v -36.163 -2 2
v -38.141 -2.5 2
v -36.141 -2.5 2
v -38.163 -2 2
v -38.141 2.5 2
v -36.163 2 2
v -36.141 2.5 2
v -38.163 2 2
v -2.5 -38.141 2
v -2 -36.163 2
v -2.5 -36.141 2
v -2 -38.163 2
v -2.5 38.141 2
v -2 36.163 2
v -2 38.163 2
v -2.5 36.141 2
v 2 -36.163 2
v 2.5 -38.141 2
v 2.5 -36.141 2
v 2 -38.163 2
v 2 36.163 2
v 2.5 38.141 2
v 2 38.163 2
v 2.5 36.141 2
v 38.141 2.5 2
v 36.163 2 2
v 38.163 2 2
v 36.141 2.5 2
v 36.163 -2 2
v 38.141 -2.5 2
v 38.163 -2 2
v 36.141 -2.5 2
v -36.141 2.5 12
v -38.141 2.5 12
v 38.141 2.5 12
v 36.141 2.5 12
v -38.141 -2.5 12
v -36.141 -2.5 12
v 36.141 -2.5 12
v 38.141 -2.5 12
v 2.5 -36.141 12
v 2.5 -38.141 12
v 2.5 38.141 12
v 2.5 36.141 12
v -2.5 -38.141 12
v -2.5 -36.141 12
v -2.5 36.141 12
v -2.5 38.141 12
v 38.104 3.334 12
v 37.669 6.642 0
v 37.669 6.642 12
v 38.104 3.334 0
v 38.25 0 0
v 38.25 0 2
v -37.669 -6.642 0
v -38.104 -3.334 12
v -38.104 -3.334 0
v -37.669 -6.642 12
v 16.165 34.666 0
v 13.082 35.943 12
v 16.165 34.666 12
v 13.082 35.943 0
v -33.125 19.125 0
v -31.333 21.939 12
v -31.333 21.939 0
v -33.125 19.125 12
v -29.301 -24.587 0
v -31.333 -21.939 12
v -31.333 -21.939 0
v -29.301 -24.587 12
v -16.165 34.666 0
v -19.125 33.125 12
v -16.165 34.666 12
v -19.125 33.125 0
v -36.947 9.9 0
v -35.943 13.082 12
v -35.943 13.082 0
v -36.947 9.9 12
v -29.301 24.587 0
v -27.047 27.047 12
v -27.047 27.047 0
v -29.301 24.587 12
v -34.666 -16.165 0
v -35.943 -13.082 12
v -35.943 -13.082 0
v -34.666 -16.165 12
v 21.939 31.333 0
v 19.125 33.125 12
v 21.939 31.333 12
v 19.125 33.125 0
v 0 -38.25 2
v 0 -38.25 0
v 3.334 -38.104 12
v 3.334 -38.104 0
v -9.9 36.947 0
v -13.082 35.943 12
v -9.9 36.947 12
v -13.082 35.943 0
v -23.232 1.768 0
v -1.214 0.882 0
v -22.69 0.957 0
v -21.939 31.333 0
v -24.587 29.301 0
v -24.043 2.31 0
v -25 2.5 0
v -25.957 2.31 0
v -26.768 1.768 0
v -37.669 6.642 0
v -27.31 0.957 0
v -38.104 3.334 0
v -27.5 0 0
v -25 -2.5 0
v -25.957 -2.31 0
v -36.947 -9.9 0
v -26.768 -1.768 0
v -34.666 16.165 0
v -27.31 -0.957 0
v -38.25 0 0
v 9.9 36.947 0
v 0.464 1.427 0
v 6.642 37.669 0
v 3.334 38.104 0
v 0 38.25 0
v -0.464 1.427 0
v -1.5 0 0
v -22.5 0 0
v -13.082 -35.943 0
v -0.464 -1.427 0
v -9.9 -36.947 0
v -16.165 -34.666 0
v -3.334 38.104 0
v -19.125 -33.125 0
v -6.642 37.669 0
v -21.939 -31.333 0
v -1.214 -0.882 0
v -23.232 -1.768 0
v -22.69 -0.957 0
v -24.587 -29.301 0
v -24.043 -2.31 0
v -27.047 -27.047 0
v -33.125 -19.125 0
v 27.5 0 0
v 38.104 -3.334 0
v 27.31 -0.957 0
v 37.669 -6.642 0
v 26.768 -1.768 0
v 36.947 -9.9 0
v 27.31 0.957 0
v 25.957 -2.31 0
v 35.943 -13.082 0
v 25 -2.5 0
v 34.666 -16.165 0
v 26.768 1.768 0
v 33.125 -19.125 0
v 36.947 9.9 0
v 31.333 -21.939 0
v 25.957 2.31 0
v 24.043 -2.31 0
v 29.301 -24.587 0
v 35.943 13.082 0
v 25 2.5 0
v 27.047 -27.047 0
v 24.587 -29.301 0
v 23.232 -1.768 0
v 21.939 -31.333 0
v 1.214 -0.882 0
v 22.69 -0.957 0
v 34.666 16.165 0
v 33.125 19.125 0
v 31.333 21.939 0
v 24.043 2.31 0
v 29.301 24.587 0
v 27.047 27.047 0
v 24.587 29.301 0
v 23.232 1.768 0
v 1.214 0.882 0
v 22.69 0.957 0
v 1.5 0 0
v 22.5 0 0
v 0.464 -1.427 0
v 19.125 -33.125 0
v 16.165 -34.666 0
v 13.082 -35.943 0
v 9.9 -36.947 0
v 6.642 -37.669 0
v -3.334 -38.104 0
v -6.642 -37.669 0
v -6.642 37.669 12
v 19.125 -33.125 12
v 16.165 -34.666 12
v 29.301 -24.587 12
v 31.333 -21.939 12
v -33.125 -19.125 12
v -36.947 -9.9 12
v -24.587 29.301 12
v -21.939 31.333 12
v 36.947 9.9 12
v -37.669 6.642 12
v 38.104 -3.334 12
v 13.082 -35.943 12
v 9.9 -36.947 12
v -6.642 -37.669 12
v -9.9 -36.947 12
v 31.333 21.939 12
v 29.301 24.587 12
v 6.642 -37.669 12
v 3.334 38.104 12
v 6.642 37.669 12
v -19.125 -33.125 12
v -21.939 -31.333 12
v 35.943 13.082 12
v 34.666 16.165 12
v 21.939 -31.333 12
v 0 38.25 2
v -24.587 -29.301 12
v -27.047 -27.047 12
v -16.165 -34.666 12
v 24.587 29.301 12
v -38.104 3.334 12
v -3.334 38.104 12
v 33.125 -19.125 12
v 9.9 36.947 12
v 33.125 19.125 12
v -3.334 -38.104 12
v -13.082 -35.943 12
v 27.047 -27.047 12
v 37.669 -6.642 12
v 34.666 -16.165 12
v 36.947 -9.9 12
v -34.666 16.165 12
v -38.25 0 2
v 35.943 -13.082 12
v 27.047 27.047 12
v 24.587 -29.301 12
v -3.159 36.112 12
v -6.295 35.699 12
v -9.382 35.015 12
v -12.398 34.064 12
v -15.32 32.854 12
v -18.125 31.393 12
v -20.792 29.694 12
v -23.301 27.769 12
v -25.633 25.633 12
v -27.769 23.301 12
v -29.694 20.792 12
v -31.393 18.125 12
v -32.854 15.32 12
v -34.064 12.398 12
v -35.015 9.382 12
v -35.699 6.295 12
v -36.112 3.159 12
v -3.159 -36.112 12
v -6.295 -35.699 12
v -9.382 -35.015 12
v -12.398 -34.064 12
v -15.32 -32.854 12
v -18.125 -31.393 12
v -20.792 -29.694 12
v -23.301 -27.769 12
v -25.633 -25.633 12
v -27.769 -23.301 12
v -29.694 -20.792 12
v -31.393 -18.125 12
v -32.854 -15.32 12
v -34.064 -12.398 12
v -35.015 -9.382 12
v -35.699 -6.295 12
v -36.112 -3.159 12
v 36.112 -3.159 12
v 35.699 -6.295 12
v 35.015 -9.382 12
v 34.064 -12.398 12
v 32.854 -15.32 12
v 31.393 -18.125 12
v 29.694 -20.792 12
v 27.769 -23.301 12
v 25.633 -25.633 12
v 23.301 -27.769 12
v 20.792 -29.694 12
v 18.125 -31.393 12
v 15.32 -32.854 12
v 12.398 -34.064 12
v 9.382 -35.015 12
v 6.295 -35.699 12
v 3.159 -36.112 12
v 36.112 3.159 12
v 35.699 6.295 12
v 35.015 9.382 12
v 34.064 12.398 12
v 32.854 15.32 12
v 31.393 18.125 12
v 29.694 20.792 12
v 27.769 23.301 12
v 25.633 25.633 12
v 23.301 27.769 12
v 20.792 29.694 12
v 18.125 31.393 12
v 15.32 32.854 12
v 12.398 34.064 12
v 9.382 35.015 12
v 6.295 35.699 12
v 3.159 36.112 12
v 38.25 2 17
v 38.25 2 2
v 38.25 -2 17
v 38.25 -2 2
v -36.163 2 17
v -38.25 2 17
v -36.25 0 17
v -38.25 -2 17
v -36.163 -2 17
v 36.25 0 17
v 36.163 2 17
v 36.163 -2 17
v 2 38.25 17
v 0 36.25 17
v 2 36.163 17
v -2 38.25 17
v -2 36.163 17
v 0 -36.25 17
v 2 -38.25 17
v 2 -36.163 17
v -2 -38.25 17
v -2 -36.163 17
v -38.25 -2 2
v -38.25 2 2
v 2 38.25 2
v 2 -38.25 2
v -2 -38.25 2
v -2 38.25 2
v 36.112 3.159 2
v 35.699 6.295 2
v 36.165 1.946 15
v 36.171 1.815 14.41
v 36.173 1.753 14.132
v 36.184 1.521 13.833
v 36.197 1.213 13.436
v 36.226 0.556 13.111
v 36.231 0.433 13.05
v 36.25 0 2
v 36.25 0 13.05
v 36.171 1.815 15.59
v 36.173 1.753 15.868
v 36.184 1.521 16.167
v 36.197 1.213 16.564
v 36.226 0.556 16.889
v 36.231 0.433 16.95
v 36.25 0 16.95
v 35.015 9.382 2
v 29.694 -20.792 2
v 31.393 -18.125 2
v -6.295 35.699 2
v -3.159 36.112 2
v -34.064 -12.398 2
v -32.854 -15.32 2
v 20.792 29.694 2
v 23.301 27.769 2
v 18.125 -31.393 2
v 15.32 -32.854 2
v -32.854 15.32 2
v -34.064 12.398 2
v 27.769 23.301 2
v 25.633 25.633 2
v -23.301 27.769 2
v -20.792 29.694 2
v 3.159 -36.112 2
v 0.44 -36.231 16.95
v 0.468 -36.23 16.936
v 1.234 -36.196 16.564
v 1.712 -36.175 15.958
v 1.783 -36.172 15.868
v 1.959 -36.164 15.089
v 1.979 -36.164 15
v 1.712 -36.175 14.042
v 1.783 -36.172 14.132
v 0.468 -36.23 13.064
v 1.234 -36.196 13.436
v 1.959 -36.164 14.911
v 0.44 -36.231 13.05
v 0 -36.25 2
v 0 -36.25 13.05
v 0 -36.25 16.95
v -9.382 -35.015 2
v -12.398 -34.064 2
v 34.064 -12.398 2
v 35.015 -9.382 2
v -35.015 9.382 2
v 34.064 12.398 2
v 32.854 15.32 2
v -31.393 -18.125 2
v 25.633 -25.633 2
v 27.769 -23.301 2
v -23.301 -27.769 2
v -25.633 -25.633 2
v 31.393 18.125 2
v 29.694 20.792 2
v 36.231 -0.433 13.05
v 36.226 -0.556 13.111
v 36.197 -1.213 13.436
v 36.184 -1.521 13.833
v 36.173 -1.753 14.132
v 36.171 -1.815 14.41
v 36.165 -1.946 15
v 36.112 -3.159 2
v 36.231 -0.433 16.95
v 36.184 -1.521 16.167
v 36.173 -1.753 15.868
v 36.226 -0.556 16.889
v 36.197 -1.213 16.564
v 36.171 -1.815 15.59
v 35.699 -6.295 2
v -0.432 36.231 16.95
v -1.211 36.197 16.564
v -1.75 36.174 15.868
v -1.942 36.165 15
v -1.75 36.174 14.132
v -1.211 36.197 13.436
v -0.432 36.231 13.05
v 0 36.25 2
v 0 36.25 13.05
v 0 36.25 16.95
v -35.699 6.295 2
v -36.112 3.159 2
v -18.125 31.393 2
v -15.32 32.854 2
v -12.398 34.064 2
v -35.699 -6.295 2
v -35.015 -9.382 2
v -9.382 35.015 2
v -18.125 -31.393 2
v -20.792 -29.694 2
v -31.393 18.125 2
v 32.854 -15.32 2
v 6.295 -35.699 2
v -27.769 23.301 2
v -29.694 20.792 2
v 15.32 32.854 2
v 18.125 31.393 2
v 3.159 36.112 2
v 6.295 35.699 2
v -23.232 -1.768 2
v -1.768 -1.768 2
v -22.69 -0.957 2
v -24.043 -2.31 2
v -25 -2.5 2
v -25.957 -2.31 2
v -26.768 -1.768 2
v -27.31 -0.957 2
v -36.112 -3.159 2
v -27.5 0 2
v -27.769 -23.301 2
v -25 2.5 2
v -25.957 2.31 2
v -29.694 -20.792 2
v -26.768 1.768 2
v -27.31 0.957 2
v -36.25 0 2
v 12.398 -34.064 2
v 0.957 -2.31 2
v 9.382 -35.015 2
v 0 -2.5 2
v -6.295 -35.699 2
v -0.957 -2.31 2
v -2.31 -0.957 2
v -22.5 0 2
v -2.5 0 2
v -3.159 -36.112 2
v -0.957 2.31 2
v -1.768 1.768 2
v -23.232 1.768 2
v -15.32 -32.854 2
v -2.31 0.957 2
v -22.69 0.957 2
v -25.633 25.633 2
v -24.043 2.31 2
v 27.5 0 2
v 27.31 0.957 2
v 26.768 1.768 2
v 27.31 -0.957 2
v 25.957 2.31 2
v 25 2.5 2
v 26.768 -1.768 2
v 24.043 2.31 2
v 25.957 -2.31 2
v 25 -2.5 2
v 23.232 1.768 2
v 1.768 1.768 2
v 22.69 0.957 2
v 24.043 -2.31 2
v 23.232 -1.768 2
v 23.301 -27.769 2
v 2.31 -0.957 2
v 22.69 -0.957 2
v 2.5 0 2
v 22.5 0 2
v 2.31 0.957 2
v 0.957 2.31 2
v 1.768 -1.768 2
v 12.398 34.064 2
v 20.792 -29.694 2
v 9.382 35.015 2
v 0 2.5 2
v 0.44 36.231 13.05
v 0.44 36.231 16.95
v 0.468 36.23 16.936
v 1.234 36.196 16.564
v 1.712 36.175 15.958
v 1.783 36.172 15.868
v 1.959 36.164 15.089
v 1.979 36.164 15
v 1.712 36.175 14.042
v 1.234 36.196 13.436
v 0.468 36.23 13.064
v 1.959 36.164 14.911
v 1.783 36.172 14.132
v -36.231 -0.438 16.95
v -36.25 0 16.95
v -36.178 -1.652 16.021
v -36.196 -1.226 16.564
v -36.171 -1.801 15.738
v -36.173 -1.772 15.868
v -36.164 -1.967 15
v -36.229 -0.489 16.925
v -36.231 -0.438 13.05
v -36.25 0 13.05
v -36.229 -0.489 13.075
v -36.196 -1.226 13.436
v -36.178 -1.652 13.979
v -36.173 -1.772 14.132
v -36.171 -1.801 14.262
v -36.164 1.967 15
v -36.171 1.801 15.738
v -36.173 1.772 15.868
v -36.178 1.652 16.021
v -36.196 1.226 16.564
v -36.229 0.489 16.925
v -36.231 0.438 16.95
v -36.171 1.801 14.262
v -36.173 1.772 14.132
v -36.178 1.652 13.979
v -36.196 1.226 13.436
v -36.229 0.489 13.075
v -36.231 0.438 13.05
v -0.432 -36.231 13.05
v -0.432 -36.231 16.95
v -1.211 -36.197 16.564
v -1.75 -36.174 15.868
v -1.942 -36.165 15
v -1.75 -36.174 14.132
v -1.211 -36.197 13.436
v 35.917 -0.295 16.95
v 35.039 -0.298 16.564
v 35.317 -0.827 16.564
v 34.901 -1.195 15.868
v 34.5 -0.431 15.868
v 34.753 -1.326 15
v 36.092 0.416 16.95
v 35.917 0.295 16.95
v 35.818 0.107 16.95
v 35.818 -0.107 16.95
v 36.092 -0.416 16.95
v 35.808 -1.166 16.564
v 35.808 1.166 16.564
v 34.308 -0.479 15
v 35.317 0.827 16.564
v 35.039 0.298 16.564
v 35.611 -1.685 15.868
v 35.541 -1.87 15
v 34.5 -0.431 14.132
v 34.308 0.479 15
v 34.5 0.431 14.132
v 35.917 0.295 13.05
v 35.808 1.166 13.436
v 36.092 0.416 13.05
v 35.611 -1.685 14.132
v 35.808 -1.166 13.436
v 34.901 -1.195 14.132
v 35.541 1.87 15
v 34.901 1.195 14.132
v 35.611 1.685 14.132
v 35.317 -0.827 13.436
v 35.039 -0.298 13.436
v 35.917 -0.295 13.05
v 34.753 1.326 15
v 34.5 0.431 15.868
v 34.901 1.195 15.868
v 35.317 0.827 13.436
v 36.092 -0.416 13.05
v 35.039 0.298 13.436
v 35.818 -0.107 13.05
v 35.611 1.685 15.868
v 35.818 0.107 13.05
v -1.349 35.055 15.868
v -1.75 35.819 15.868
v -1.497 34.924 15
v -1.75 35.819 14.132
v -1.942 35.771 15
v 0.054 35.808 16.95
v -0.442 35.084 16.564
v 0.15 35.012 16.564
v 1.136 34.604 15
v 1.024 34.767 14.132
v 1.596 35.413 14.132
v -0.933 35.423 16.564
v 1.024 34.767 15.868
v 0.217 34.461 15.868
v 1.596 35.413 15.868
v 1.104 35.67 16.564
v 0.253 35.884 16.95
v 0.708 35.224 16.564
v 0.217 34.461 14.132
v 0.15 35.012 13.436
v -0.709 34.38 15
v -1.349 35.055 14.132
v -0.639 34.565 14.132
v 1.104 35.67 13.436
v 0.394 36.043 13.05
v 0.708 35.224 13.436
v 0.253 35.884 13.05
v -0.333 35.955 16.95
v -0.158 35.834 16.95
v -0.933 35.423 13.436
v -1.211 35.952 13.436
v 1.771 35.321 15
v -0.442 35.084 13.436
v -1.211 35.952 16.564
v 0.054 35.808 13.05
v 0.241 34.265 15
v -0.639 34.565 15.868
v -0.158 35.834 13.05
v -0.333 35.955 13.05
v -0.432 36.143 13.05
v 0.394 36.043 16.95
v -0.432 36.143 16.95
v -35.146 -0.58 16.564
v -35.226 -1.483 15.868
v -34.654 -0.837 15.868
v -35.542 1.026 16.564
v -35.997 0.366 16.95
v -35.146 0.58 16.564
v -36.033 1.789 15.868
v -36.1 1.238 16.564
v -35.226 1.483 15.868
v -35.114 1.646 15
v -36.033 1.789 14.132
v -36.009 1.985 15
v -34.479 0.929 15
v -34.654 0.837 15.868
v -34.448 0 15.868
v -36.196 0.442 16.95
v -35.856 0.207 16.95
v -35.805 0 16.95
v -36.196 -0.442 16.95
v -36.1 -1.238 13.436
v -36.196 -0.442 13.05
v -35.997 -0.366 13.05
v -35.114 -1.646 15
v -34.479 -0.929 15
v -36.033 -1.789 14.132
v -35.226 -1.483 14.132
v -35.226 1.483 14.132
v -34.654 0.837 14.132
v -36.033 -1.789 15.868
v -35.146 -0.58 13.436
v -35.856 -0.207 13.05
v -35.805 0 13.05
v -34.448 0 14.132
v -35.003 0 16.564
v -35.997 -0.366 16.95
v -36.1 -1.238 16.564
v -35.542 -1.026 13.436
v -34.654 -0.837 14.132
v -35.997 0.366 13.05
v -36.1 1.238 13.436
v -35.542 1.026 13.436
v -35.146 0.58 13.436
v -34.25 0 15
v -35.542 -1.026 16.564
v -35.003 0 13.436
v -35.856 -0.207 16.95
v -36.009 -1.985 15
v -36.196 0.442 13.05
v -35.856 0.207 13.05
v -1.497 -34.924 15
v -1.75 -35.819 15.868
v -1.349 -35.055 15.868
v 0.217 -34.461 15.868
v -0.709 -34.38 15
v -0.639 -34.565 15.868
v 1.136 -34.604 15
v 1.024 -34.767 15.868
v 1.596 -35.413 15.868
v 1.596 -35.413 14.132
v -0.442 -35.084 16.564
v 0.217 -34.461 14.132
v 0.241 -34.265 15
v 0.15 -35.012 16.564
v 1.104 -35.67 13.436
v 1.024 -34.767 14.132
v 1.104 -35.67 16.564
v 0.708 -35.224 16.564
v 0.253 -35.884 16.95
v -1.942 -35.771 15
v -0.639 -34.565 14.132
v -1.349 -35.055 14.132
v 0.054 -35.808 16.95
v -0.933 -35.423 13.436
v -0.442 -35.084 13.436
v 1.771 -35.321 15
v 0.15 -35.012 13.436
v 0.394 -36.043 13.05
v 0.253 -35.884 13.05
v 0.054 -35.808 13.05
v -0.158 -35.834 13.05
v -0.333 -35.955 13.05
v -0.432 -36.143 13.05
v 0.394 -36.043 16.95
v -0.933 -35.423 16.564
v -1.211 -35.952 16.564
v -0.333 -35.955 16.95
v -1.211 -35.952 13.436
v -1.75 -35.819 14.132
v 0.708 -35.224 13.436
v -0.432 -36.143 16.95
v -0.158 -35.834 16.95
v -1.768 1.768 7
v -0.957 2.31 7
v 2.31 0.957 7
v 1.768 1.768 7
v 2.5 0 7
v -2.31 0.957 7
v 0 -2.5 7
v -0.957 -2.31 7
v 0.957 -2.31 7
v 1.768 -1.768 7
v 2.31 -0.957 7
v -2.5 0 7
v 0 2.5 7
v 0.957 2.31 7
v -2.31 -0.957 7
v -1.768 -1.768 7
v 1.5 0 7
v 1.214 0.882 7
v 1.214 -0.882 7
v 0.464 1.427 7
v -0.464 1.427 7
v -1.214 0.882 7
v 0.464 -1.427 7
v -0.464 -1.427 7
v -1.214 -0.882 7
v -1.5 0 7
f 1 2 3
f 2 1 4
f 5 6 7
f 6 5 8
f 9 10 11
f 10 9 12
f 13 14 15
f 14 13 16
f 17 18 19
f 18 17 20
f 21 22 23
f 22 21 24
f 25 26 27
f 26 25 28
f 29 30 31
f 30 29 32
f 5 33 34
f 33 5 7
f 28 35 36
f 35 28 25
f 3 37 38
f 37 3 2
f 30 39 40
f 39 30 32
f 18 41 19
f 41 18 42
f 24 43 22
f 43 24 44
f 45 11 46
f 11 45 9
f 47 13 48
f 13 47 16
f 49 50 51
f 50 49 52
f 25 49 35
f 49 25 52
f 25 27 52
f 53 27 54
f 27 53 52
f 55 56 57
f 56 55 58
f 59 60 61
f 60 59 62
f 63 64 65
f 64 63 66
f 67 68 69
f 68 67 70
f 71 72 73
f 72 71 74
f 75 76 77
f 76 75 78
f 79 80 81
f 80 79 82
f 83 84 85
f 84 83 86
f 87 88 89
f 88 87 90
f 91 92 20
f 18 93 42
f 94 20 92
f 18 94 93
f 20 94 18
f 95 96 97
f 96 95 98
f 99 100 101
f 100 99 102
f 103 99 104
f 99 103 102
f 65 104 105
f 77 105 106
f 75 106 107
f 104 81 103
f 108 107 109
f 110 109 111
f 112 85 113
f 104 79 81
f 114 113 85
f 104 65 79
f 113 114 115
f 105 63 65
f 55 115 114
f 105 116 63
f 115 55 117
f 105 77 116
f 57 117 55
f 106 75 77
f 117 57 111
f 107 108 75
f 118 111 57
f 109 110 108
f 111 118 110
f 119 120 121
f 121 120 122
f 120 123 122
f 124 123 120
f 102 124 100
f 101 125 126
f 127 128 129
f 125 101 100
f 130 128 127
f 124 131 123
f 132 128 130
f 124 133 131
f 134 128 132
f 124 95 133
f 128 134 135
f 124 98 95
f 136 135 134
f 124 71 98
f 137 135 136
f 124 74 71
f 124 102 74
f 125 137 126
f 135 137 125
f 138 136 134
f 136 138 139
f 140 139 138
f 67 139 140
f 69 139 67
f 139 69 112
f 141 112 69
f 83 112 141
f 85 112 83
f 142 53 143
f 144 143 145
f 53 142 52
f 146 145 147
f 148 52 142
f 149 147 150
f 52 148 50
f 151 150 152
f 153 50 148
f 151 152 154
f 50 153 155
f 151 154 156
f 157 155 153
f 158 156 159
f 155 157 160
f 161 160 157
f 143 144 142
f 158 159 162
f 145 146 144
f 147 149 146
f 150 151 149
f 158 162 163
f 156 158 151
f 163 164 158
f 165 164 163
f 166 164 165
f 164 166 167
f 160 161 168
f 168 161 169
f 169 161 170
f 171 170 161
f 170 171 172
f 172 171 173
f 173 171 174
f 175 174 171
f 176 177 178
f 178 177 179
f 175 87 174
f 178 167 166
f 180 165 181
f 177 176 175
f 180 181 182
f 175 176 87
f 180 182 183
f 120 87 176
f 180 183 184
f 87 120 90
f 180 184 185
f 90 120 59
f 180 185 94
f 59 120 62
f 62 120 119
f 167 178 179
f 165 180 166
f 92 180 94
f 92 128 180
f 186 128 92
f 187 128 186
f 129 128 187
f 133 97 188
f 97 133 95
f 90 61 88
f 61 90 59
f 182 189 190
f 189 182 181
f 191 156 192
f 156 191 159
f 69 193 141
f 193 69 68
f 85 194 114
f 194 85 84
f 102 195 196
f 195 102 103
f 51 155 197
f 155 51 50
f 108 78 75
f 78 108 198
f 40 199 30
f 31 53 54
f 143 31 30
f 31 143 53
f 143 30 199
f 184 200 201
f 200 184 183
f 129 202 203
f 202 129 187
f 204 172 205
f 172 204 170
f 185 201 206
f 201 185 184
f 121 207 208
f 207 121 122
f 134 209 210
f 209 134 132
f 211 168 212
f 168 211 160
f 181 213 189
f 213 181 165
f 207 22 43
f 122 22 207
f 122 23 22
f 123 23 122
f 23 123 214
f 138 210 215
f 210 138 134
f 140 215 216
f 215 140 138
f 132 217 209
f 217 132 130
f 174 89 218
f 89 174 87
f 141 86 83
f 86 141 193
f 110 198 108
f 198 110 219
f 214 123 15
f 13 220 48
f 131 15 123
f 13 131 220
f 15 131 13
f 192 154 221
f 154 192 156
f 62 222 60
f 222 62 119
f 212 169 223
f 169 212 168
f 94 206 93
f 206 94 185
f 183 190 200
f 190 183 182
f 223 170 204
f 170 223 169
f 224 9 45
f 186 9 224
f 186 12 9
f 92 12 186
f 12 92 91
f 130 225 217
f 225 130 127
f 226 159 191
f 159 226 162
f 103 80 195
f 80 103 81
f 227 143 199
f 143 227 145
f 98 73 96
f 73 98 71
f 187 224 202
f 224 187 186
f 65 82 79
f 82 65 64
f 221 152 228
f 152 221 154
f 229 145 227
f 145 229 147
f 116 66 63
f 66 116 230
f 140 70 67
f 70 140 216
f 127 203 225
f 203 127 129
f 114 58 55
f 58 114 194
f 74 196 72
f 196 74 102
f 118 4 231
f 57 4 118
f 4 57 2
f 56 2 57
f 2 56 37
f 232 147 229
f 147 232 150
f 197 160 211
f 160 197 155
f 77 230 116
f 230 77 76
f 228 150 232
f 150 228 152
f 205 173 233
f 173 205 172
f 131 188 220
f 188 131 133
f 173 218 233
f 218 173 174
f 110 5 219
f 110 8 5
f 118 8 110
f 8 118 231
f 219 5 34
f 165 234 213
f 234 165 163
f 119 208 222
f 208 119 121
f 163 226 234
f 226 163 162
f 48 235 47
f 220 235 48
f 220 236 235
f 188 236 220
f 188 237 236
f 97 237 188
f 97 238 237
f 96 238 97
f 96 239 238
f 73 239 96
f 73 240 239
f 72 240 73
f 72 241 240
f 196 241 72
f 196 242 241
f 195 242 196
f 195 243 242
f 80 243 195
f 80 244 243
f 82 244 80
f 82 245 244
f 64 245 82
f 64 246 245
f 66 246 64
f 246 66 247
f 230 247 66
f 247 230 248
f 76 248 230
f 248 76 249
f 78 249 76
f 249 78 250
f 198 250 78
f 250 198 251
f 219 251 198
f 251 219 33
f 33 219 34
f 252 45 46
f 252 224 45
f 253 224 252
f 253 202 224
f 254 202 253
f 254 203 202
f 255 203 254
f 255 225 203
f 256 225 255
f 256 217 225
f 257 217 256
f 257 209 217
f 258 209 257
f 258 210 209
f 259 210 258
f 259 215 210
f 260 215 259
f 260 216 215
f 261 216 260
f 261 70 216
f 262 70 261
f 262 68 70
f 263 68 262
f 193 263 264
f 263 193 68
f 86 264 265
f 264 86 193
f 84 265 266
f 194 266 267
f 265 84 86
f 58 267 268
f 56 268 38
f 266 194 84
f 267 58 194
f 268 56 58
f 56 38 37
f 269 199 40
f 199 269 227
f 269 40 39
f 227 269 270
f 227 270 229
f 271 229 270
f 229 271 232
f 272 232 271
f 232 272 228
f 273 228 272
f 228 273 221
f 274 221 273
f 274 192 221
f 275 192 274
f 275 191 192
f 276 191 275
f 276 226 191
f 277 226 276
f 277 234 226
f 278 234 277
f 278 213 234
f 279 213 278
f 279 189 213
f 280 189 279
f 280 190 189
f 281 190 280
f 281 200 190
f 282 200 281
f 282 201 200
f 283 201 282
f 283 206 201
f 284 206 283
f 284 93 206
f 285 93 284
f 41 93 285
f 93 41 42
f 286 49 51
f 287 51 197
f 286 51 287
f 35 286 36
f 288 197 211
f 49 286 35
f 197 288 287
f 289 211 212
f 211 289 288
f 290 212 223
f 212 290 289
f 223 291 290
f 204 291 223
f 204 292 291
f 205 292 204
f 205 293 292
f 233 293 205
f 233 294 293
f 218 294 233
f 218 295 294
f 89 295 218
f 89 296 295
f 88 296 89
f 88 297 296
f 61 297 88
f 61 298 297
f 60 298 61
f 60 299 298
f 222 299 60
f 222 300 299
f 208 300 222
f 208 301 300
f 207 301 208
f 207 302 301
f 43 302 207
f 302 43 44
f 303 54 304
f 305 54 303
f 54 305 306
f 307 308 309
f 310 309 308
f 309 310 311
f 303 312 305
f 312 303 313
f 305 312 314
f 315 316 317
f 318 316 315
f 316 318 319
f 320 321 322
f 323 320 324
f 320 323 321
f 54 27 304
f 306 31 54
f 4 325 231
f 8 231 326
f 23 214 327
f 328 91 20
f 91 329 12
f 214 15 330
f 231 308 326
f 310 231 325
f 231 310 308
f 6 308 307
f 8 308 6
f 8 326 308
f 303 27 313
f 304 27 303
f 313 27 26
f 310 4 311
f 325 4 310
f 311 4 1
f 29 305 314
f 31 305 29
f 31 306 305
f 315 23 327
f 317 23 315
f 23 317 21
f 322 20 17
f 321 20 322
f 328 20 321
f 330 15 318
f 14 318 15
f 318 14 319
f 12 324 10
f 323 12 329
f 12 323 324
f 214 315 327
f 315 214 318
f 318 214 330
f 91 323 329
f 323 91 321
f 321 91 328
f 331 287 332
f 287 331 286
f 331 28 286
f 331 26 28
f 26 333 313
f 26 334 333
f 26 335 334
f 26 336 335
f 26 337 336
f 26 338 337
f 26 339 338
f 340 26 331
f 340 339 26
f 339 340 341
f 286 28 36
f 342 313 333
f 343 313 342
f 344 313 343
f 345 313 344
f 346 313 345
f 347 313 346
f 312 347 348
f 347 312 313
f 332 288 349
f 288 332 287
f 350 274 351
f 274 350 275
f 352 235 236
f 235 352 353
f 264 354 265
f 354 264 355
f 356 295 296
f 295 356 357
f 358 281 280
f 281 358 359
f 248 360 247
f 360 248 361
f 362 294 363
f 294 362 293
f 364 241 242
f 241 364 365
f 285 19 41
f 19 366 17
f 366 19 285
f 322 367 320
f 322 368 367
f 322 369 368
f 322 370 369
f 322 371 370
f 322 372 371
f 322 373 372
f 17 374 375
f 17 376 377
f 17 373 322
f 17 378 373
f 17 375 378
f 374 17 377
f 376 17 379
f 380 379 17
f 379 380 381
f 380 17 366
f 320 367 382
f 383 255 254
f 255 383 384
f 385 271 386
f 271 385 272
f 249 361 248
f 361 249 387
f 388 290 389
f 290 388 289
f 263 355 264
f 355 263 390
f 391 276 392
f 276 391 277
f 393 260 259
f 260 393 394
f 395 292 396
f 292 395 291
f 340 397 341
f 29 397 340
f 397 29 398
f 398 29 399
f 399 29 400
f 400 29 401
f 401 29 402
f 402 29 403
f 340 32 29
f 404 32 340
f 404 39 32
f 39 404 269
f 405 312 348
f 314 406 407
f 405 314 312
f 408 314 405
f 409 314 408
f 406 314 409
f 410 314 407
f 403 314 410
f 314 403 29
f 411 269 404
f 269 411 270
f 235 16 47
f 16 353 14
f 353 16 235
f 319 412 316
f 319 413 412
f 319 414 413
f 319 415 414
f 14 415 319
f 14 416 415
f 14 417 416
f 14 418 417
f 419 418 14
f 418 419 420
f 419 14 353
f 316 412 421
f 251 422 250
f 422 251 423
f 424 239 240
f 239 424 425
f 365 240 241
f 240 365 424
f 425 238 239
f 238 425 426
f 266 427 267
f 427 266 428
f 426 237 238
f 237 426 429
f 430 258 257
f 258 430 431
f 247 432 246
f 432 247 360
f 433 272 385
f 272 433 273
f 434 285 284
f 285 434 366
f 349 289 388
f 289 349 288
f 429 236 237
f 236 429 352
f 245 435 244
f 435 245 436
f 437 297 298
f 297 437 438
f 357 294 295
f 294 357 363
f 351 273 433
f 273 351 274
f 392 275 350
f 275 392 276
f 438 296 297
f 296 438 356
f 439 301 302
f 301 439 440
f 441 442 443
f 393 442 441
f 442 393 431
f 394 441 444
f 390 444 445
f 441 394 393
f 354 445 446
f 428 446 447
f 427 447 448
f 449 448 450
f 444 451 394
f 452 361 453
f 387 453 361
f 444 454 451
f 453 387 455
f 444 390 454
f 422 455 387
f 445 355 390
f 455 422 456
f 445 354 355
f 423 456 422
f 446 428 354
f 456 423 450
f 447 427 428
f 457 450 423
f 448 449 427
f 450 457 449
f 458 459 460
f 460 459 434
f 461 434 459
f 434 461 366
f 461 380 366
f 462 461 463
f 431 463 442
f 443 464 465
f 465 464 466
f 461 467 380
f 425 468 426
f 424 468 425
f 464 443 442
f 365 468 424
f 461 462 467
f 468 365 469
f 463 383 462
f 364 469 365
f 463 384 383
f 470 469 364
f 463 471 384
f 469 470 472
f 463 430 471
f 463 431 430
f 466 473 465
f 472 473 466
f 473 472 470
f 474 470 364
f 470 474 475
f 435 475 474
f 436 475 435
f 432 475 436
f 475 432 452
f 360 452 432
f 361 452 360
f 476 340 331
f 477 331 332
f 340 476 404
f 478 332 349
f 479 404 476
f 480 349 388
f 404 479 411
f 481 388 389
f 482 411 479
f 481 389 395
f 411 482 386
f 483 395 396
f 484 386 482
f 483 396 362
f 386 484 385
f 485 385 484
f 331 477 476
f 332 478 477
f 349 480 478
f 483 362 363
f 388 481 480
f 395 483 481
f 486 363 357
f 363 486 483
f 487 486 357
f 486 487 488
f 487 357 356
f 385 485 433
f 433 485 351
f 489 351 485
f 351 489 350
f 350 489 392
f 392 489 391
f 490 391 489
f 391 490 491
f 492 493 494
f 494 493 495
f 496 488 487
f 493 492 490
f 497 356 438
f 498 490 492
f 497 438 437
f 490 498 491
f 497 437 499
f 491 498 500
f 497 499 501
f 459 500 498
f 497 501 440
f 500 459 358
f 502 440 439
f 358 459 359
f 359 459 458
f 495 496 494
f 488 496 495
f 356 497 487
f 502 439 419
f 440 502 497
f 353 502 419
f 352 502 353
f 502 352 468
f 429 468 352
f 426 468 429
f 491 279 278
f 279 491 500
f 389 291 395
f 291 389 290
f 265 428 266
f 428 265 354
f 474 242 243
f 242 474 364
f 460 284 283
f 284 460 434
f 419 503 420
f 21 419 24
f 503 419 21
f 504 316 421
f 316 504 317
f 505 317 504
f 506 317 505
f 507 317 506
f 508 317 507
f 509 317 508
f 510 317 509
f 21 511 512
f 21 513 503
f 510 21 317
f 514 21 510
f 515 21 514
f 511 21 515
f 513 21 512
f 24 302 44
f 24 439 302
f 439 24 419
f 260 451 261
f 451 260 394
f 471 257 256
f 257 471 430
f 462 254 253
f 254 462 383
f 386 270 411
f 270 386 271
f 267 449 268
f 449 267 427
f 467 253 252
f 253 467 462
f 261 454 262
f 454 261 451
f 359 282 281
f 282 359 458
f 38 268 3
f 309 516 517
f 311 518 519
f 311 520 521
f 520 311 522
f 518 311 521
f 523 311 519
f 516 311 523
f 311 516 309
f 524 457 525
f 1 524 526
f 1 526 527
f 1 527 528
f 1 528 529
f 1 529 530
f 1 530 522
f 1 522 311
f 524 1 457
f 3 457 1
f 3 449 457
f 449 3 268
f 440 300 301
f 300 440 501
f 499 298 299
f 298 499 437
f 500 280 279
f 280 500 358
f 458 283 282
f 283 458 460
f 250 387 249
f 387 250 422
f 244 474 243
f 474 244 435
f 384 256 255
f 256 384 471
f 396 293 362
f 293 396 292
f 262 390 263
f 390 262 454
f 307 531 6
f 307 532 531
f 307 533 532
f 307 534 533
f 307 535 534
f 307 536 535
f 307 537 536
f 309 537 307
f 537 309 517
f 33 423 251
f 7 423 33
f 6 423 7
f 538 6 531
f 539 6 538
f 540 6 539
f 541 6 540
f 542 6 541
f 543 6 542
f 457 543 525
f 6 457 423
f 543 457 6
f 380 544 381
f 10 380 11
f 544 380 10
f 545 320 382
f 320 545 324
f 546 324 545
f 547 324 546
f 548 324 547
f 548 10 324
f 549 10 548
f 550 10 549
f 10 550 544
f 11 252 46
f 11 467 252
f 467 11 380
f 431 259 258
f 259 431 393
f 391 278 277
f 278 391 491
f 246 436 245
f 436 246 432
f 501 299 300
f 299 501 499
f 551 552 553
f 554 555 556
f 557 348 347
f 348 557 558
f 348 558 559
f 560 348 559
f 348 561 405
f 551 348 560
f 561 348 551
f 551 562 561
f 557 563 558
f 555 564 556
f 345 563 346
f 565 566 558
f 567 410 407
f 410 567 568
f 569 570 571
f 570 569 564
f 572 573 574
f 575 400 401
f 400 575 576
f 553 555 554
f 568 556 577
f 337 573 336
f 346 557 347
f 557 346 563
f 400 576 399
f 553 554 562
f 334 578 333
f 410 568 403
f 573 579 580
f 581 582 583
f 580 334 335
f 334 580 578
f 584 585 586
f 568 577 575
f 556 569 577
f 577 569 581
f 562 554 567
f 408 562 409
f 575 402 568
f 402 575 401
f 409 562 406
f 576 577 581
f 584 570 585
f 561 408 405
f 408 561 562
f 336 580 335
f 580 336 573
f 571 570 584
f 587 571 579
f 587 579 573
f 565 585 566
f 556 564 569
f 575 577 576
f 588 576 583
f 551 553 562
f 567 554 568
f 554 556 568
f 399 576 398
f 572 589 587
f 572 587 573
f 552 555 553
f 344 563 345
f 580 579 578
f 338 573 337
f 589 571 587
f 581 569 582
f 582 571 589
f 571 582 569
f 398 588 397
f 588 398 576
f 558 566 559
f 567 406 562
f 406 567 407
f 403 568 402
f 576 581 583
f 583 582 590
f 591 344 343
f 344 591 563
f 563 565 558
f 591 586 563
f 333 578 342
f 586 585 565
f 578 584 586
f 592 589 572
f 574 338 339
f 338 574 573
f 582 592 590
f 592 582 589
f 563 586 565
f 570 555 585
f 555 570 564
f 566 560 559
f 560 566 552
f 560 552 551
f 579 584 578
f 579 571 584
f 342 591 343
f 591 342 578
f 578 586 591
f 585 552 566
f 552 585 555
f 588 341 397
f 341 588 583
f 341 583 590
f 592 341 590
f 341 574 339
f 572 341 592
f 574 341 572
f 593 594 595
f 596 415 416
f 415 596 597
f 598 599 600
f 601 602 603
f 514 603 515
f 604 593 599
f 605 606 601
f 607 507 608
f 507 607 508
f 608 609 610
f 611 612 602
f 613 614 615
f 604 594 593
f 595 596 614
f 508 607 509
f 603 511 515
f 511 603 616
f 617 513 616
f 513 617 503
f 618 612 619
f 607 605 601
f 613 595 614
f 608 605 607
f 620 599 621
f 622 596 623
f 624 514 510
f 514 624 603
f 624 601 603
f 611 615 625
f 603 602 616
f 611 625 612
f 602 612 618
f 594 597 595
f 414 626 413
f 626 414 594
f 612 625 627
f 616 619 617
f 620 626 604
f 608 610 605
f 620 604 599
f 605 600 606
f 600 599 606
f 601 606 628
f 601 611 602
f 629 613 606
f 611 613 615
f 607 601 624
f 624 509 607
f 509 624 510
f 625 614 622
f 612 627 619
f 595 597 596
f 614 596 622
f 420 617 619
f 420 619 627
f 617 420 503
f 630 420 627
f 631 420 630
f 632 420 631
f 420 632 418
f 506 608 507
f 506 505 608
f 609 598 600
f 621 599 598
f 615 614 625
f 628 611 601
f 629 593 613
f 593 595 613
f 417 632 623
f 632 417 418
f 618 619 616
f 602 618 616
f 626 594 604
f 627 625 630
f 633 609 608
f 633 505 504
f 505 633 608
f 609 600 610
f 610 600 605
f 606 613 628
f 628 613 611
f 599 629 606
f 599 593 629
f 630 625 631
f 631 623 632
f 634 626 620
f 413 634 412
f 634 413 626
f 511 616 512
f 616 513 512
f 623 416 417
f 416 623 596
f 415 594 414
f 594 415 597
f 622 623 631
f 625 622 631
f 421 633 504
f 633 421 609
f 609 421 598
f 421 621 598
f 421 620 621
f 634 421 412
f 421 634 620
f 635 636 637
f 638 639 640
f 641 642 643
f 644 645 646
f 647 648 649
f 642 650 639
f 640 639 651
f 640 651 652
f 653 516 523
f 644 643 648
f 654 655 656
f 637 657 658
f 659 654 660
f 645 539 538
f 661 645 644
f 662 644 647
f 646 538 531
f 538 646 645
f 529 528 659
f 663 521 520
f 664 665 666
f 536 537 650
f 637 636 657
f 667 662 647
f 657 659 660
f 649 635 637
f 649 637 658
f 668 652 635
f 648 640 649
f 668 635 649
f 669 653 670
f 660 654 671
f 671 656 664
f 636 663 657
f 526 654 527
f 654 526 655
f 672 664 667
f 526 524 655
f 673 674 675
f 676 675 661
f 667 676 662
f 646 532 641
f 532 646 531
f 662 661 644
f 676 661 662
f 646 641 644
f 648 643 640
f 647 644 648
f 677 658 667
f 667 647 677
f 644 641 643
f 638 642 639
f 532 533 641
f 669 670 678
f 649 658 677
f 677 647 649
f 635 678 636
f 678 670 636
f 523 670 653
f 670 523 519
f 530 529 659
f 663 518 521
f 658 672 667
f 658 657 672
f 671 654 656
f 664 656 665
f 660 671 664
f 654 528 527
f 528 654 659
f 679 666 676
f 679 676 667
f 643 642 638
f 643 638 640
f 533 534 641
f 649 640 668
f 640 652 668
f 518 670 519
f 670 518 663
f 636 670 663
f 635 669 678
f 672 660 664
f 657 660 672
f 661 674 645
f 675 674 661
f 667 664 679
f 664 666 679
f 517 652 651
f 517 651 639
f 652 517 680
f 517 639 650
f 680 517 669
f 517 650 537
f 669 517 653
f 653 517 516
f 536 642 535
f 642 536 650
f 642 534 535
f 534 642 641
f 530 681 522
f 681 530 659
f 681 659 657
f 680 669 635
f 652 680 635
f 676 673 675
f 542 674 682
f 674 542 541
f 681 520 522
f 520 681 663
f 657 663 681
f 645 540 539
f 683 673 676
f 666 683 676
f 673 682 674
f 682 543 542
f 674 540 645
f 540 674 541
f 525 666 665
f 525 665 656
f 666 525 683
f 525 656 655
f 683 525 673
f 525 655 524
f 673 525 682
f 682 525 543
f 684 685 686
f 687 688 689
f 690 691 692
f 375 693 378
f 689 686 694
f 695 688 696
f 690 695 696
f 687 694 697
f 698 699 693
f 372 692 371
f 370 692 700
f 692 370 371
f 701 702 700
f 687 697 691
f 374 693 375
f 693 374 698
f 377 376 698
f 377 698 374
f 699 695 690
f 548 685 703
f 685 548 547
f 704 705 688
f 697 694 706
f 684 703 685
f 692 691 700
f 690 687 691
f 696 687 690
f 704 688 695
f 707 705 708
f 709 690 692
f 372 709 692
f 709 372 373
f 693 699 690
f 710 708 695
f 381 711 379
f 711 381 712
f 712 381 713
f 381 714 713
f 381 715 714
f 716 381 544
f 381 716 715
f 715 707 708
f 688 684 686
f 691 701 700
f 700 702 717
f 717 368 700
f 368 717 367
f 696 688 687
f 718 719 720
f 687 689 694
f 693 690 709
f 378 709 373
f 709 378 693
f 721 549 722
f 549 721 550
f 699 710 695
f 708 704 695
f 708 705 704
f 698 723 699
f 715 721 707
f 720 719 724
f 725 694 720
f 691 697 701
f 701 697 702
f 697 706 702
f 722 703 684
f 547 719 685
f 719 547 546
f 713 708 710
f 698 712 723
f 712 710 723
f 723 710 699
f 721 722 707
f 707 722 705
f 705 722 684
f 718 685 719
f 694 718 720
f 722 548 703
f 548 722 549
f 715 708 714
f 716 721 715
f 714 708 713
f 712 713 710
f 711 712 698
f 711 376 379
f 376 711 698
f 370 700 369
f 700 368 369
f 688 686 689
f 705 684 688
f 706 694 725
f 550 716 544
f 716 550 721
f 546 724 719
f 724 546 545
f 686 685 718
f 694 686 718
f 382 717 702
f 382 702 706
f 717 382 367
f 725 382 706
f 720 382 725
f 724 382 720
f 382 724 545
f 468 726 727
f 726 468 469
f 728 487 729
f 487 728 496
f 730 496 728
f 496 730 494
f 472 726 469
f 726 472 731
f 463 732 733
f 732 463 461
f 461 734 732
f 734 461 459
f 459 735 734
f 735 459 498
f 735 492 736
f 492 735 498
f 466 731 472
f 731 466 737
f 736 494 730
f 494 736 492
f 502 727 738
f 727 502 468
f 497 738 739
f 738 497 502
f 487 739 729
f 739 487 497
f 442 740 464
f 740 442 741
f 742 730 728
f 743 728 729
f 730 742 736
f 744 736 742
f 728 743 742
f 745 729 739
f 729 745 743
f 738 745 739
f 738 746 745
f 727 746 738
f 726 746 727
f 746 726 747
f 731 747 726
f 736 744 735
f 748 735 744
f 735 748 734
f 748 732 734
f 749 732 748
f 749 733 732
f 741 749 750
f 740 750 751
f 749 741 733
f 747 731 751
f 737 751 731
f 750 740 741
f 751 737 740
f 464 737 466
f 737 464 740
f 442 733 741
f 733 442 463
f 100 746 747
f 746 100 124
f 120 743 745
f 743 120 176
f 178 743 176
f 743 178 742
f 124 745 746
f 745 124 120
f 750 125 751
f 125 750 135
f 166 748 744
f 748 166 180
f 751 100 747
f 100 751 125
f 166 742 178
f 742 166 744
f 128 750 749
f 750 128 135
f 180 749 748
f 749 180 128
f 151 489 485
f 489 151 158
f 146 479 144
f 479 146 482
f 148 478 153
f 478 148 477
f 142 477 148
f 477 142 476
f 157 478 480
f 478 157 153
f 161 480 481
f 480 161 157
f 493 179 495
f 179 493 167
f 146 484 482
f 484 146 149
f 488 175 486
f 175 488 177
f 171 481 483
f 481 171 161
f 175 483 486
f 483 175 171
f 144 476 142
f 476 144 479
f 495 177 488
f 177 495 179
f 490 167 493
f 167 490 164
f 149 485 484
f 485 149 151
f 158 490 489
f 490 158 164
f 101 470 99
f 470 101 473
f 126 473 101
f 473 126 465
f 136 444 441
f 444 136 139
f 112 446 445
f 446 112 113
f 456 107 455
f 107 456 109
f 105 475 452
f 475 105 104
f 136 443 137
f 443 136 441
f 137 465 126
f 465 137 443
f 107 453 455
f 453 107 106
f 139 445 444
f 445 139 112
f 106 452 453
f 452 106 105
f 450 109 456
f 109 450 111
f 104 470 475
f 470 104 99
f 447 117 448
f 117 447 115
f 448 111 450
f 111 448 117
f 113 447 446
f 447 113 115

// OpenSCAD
// internet-button-case.scad
//
// generates an l-bracket from the given parameters


// Copyright (c) 2015, Patrick Barrett
// All rights reserved.
//
// Redistribution and use in source and binary forms, with or without
// modification, are permitted provided that the following conditions are met:
//
// 1. Redistributions of source code must retain the above copyright notice,
// this list of conditions and the following disclaimer.
//
// 2. Redistributions in binary form must reproduce the above copyright notice,
// this list of conditions and the following disclaimer in the documentation
// and/or other materials provided with the distribution.
//
// THIS SOFTWARE IS PROVIDED BY THE COPYRIGHT HOLDERS AND CONTRIBUTORS "AS IS"
// AND ANY EXPRESS OR IMPLIED WARRANTIES, INCLUDING, BUT NOT LIMITED TO, THE
// IMPLIED WARRANTIES OF MERCHANTABILITY AND FITNESS FOR A PARTICULAR PURPOSE
// ARE DISCLAIMED. IN NO EVENT SHALL THE COPYRIGHT HOLDER OR CONTRIBUTORS BE
// LIABLE FOR ANY DIRECT, INDIRECT, INCIDENTAL, SPECIAL, EXEMPLARY, OR
// CONSEQUENTIAL DAMAGES (INCLUDING, BUT NOT LIMITED TO, PROCUREMENT OF
// SUBSTITUTE GOODS OR SERVICES; LOSS OF USE, DATA, OR PROFITS; OR BUSINESS
// INTERRUPTION) HOWEVER CAUSED AND ON ANY THEORY OF LIABILITY, WHETHER IN
// CONTRACT, STRICT LIABILITY, OR TORT (INCLUDING NEGLIGENCE OR OTHERWISE)
// ARISING IN ANY WAY OUT OF THE USE OF THIS SOFTWARE, EVEN IF ADVISED OF THE
// POSSIBILITY OF SUCH DAMAGE.

wall_thickness = 2;
internal_diameter = 72.5;
internal_depth = 10;

boss_diameter = 5;
boss_height = 5;
boss_internal_diameter = 3;

screw_hole_diameter = 5;

use_tabs = true;

tab_height = 15;
tab_width = 4;
tab_bump_radius = 2;

$fs = 1;
$fa = 5;

// customizable variables end here

abit = 0.000001;
alot = 10000000;

difference() {
    union() {
        difference() {
            union() {
                difference() {
                    // main body
                    cylinder(h = internal_depth + wall_thickness,
                             d = internal_diameter +  wall_thickness*2);
                    
                    if(use_tabs){
                        // tab cutouts
                        translate([0,0,wall_thickness + tab_height/2 + abit])
                            cube([internal_diameter +  wall_thickness*2, tab_width+1, tab_height], center=true);
                        translate([0,0,wall_thickness + tab_height/2 + abit])
                            cube([tab_width+1, internal_diameter +  wall_thickness*2, tab_height], center=true);
                    }
                }
                if(use_tabs){
                    // tabs
                    translate([0,0,wall_thickness + tab_height/2 - abit])
                        cube([internal_diameter +  wall_thickness*2, tab_width, tab_height], center=true);
                    translate([0,0,wall_thickness + tab_height/2 - abit])
                        cube([tab_width, internal_diameter +  wall_thickness*2, tab_height], center=true);
                }
            }
            // main cutout
            translate([0,0,wall_thickness])
                cylinder(h = alot, d = internal_diameter);
        }
        // screw boss
        translate([0,0,wall_thickness-abit])
            cylinder(h = boss_height, d = boss_diameter);
        
        if(use_tabs){
            // tab dots
            translate([internal_diameter/2,0,wall_thickness + tab_height - (tab_bump_radius)])
                sphere(tab_bump_radius, center=true);
            translate([0,internal_diameter/2,wall_thickness + tab_height - (tab_bump_radius)])
                sphere(tab_bump_radius, center=true);
            translate([-internal_diameter/2,0,wall_thickness + tab_height - (tab_bump_radius)])
                sphere(tab_bump_radius, center=true);
            translate([0,-internal_diameter/2,wall_thickness + tab_height - (tab_bump_radius)])
                sphere(tab_bump_radius, center=true);
        }
    }
    // screw boss hole
    translate([0,0,-5])
        cylinder(h = 20, d = boss_internal_diameter);
    
    // wall mount holes
    translate([25,0,-5])
        cylinder(h = alot, d = screw_hole_diameter);
    translate([-25,0,-5])
        cylinder(h = alot, d = screw_hole_diameter);
}
